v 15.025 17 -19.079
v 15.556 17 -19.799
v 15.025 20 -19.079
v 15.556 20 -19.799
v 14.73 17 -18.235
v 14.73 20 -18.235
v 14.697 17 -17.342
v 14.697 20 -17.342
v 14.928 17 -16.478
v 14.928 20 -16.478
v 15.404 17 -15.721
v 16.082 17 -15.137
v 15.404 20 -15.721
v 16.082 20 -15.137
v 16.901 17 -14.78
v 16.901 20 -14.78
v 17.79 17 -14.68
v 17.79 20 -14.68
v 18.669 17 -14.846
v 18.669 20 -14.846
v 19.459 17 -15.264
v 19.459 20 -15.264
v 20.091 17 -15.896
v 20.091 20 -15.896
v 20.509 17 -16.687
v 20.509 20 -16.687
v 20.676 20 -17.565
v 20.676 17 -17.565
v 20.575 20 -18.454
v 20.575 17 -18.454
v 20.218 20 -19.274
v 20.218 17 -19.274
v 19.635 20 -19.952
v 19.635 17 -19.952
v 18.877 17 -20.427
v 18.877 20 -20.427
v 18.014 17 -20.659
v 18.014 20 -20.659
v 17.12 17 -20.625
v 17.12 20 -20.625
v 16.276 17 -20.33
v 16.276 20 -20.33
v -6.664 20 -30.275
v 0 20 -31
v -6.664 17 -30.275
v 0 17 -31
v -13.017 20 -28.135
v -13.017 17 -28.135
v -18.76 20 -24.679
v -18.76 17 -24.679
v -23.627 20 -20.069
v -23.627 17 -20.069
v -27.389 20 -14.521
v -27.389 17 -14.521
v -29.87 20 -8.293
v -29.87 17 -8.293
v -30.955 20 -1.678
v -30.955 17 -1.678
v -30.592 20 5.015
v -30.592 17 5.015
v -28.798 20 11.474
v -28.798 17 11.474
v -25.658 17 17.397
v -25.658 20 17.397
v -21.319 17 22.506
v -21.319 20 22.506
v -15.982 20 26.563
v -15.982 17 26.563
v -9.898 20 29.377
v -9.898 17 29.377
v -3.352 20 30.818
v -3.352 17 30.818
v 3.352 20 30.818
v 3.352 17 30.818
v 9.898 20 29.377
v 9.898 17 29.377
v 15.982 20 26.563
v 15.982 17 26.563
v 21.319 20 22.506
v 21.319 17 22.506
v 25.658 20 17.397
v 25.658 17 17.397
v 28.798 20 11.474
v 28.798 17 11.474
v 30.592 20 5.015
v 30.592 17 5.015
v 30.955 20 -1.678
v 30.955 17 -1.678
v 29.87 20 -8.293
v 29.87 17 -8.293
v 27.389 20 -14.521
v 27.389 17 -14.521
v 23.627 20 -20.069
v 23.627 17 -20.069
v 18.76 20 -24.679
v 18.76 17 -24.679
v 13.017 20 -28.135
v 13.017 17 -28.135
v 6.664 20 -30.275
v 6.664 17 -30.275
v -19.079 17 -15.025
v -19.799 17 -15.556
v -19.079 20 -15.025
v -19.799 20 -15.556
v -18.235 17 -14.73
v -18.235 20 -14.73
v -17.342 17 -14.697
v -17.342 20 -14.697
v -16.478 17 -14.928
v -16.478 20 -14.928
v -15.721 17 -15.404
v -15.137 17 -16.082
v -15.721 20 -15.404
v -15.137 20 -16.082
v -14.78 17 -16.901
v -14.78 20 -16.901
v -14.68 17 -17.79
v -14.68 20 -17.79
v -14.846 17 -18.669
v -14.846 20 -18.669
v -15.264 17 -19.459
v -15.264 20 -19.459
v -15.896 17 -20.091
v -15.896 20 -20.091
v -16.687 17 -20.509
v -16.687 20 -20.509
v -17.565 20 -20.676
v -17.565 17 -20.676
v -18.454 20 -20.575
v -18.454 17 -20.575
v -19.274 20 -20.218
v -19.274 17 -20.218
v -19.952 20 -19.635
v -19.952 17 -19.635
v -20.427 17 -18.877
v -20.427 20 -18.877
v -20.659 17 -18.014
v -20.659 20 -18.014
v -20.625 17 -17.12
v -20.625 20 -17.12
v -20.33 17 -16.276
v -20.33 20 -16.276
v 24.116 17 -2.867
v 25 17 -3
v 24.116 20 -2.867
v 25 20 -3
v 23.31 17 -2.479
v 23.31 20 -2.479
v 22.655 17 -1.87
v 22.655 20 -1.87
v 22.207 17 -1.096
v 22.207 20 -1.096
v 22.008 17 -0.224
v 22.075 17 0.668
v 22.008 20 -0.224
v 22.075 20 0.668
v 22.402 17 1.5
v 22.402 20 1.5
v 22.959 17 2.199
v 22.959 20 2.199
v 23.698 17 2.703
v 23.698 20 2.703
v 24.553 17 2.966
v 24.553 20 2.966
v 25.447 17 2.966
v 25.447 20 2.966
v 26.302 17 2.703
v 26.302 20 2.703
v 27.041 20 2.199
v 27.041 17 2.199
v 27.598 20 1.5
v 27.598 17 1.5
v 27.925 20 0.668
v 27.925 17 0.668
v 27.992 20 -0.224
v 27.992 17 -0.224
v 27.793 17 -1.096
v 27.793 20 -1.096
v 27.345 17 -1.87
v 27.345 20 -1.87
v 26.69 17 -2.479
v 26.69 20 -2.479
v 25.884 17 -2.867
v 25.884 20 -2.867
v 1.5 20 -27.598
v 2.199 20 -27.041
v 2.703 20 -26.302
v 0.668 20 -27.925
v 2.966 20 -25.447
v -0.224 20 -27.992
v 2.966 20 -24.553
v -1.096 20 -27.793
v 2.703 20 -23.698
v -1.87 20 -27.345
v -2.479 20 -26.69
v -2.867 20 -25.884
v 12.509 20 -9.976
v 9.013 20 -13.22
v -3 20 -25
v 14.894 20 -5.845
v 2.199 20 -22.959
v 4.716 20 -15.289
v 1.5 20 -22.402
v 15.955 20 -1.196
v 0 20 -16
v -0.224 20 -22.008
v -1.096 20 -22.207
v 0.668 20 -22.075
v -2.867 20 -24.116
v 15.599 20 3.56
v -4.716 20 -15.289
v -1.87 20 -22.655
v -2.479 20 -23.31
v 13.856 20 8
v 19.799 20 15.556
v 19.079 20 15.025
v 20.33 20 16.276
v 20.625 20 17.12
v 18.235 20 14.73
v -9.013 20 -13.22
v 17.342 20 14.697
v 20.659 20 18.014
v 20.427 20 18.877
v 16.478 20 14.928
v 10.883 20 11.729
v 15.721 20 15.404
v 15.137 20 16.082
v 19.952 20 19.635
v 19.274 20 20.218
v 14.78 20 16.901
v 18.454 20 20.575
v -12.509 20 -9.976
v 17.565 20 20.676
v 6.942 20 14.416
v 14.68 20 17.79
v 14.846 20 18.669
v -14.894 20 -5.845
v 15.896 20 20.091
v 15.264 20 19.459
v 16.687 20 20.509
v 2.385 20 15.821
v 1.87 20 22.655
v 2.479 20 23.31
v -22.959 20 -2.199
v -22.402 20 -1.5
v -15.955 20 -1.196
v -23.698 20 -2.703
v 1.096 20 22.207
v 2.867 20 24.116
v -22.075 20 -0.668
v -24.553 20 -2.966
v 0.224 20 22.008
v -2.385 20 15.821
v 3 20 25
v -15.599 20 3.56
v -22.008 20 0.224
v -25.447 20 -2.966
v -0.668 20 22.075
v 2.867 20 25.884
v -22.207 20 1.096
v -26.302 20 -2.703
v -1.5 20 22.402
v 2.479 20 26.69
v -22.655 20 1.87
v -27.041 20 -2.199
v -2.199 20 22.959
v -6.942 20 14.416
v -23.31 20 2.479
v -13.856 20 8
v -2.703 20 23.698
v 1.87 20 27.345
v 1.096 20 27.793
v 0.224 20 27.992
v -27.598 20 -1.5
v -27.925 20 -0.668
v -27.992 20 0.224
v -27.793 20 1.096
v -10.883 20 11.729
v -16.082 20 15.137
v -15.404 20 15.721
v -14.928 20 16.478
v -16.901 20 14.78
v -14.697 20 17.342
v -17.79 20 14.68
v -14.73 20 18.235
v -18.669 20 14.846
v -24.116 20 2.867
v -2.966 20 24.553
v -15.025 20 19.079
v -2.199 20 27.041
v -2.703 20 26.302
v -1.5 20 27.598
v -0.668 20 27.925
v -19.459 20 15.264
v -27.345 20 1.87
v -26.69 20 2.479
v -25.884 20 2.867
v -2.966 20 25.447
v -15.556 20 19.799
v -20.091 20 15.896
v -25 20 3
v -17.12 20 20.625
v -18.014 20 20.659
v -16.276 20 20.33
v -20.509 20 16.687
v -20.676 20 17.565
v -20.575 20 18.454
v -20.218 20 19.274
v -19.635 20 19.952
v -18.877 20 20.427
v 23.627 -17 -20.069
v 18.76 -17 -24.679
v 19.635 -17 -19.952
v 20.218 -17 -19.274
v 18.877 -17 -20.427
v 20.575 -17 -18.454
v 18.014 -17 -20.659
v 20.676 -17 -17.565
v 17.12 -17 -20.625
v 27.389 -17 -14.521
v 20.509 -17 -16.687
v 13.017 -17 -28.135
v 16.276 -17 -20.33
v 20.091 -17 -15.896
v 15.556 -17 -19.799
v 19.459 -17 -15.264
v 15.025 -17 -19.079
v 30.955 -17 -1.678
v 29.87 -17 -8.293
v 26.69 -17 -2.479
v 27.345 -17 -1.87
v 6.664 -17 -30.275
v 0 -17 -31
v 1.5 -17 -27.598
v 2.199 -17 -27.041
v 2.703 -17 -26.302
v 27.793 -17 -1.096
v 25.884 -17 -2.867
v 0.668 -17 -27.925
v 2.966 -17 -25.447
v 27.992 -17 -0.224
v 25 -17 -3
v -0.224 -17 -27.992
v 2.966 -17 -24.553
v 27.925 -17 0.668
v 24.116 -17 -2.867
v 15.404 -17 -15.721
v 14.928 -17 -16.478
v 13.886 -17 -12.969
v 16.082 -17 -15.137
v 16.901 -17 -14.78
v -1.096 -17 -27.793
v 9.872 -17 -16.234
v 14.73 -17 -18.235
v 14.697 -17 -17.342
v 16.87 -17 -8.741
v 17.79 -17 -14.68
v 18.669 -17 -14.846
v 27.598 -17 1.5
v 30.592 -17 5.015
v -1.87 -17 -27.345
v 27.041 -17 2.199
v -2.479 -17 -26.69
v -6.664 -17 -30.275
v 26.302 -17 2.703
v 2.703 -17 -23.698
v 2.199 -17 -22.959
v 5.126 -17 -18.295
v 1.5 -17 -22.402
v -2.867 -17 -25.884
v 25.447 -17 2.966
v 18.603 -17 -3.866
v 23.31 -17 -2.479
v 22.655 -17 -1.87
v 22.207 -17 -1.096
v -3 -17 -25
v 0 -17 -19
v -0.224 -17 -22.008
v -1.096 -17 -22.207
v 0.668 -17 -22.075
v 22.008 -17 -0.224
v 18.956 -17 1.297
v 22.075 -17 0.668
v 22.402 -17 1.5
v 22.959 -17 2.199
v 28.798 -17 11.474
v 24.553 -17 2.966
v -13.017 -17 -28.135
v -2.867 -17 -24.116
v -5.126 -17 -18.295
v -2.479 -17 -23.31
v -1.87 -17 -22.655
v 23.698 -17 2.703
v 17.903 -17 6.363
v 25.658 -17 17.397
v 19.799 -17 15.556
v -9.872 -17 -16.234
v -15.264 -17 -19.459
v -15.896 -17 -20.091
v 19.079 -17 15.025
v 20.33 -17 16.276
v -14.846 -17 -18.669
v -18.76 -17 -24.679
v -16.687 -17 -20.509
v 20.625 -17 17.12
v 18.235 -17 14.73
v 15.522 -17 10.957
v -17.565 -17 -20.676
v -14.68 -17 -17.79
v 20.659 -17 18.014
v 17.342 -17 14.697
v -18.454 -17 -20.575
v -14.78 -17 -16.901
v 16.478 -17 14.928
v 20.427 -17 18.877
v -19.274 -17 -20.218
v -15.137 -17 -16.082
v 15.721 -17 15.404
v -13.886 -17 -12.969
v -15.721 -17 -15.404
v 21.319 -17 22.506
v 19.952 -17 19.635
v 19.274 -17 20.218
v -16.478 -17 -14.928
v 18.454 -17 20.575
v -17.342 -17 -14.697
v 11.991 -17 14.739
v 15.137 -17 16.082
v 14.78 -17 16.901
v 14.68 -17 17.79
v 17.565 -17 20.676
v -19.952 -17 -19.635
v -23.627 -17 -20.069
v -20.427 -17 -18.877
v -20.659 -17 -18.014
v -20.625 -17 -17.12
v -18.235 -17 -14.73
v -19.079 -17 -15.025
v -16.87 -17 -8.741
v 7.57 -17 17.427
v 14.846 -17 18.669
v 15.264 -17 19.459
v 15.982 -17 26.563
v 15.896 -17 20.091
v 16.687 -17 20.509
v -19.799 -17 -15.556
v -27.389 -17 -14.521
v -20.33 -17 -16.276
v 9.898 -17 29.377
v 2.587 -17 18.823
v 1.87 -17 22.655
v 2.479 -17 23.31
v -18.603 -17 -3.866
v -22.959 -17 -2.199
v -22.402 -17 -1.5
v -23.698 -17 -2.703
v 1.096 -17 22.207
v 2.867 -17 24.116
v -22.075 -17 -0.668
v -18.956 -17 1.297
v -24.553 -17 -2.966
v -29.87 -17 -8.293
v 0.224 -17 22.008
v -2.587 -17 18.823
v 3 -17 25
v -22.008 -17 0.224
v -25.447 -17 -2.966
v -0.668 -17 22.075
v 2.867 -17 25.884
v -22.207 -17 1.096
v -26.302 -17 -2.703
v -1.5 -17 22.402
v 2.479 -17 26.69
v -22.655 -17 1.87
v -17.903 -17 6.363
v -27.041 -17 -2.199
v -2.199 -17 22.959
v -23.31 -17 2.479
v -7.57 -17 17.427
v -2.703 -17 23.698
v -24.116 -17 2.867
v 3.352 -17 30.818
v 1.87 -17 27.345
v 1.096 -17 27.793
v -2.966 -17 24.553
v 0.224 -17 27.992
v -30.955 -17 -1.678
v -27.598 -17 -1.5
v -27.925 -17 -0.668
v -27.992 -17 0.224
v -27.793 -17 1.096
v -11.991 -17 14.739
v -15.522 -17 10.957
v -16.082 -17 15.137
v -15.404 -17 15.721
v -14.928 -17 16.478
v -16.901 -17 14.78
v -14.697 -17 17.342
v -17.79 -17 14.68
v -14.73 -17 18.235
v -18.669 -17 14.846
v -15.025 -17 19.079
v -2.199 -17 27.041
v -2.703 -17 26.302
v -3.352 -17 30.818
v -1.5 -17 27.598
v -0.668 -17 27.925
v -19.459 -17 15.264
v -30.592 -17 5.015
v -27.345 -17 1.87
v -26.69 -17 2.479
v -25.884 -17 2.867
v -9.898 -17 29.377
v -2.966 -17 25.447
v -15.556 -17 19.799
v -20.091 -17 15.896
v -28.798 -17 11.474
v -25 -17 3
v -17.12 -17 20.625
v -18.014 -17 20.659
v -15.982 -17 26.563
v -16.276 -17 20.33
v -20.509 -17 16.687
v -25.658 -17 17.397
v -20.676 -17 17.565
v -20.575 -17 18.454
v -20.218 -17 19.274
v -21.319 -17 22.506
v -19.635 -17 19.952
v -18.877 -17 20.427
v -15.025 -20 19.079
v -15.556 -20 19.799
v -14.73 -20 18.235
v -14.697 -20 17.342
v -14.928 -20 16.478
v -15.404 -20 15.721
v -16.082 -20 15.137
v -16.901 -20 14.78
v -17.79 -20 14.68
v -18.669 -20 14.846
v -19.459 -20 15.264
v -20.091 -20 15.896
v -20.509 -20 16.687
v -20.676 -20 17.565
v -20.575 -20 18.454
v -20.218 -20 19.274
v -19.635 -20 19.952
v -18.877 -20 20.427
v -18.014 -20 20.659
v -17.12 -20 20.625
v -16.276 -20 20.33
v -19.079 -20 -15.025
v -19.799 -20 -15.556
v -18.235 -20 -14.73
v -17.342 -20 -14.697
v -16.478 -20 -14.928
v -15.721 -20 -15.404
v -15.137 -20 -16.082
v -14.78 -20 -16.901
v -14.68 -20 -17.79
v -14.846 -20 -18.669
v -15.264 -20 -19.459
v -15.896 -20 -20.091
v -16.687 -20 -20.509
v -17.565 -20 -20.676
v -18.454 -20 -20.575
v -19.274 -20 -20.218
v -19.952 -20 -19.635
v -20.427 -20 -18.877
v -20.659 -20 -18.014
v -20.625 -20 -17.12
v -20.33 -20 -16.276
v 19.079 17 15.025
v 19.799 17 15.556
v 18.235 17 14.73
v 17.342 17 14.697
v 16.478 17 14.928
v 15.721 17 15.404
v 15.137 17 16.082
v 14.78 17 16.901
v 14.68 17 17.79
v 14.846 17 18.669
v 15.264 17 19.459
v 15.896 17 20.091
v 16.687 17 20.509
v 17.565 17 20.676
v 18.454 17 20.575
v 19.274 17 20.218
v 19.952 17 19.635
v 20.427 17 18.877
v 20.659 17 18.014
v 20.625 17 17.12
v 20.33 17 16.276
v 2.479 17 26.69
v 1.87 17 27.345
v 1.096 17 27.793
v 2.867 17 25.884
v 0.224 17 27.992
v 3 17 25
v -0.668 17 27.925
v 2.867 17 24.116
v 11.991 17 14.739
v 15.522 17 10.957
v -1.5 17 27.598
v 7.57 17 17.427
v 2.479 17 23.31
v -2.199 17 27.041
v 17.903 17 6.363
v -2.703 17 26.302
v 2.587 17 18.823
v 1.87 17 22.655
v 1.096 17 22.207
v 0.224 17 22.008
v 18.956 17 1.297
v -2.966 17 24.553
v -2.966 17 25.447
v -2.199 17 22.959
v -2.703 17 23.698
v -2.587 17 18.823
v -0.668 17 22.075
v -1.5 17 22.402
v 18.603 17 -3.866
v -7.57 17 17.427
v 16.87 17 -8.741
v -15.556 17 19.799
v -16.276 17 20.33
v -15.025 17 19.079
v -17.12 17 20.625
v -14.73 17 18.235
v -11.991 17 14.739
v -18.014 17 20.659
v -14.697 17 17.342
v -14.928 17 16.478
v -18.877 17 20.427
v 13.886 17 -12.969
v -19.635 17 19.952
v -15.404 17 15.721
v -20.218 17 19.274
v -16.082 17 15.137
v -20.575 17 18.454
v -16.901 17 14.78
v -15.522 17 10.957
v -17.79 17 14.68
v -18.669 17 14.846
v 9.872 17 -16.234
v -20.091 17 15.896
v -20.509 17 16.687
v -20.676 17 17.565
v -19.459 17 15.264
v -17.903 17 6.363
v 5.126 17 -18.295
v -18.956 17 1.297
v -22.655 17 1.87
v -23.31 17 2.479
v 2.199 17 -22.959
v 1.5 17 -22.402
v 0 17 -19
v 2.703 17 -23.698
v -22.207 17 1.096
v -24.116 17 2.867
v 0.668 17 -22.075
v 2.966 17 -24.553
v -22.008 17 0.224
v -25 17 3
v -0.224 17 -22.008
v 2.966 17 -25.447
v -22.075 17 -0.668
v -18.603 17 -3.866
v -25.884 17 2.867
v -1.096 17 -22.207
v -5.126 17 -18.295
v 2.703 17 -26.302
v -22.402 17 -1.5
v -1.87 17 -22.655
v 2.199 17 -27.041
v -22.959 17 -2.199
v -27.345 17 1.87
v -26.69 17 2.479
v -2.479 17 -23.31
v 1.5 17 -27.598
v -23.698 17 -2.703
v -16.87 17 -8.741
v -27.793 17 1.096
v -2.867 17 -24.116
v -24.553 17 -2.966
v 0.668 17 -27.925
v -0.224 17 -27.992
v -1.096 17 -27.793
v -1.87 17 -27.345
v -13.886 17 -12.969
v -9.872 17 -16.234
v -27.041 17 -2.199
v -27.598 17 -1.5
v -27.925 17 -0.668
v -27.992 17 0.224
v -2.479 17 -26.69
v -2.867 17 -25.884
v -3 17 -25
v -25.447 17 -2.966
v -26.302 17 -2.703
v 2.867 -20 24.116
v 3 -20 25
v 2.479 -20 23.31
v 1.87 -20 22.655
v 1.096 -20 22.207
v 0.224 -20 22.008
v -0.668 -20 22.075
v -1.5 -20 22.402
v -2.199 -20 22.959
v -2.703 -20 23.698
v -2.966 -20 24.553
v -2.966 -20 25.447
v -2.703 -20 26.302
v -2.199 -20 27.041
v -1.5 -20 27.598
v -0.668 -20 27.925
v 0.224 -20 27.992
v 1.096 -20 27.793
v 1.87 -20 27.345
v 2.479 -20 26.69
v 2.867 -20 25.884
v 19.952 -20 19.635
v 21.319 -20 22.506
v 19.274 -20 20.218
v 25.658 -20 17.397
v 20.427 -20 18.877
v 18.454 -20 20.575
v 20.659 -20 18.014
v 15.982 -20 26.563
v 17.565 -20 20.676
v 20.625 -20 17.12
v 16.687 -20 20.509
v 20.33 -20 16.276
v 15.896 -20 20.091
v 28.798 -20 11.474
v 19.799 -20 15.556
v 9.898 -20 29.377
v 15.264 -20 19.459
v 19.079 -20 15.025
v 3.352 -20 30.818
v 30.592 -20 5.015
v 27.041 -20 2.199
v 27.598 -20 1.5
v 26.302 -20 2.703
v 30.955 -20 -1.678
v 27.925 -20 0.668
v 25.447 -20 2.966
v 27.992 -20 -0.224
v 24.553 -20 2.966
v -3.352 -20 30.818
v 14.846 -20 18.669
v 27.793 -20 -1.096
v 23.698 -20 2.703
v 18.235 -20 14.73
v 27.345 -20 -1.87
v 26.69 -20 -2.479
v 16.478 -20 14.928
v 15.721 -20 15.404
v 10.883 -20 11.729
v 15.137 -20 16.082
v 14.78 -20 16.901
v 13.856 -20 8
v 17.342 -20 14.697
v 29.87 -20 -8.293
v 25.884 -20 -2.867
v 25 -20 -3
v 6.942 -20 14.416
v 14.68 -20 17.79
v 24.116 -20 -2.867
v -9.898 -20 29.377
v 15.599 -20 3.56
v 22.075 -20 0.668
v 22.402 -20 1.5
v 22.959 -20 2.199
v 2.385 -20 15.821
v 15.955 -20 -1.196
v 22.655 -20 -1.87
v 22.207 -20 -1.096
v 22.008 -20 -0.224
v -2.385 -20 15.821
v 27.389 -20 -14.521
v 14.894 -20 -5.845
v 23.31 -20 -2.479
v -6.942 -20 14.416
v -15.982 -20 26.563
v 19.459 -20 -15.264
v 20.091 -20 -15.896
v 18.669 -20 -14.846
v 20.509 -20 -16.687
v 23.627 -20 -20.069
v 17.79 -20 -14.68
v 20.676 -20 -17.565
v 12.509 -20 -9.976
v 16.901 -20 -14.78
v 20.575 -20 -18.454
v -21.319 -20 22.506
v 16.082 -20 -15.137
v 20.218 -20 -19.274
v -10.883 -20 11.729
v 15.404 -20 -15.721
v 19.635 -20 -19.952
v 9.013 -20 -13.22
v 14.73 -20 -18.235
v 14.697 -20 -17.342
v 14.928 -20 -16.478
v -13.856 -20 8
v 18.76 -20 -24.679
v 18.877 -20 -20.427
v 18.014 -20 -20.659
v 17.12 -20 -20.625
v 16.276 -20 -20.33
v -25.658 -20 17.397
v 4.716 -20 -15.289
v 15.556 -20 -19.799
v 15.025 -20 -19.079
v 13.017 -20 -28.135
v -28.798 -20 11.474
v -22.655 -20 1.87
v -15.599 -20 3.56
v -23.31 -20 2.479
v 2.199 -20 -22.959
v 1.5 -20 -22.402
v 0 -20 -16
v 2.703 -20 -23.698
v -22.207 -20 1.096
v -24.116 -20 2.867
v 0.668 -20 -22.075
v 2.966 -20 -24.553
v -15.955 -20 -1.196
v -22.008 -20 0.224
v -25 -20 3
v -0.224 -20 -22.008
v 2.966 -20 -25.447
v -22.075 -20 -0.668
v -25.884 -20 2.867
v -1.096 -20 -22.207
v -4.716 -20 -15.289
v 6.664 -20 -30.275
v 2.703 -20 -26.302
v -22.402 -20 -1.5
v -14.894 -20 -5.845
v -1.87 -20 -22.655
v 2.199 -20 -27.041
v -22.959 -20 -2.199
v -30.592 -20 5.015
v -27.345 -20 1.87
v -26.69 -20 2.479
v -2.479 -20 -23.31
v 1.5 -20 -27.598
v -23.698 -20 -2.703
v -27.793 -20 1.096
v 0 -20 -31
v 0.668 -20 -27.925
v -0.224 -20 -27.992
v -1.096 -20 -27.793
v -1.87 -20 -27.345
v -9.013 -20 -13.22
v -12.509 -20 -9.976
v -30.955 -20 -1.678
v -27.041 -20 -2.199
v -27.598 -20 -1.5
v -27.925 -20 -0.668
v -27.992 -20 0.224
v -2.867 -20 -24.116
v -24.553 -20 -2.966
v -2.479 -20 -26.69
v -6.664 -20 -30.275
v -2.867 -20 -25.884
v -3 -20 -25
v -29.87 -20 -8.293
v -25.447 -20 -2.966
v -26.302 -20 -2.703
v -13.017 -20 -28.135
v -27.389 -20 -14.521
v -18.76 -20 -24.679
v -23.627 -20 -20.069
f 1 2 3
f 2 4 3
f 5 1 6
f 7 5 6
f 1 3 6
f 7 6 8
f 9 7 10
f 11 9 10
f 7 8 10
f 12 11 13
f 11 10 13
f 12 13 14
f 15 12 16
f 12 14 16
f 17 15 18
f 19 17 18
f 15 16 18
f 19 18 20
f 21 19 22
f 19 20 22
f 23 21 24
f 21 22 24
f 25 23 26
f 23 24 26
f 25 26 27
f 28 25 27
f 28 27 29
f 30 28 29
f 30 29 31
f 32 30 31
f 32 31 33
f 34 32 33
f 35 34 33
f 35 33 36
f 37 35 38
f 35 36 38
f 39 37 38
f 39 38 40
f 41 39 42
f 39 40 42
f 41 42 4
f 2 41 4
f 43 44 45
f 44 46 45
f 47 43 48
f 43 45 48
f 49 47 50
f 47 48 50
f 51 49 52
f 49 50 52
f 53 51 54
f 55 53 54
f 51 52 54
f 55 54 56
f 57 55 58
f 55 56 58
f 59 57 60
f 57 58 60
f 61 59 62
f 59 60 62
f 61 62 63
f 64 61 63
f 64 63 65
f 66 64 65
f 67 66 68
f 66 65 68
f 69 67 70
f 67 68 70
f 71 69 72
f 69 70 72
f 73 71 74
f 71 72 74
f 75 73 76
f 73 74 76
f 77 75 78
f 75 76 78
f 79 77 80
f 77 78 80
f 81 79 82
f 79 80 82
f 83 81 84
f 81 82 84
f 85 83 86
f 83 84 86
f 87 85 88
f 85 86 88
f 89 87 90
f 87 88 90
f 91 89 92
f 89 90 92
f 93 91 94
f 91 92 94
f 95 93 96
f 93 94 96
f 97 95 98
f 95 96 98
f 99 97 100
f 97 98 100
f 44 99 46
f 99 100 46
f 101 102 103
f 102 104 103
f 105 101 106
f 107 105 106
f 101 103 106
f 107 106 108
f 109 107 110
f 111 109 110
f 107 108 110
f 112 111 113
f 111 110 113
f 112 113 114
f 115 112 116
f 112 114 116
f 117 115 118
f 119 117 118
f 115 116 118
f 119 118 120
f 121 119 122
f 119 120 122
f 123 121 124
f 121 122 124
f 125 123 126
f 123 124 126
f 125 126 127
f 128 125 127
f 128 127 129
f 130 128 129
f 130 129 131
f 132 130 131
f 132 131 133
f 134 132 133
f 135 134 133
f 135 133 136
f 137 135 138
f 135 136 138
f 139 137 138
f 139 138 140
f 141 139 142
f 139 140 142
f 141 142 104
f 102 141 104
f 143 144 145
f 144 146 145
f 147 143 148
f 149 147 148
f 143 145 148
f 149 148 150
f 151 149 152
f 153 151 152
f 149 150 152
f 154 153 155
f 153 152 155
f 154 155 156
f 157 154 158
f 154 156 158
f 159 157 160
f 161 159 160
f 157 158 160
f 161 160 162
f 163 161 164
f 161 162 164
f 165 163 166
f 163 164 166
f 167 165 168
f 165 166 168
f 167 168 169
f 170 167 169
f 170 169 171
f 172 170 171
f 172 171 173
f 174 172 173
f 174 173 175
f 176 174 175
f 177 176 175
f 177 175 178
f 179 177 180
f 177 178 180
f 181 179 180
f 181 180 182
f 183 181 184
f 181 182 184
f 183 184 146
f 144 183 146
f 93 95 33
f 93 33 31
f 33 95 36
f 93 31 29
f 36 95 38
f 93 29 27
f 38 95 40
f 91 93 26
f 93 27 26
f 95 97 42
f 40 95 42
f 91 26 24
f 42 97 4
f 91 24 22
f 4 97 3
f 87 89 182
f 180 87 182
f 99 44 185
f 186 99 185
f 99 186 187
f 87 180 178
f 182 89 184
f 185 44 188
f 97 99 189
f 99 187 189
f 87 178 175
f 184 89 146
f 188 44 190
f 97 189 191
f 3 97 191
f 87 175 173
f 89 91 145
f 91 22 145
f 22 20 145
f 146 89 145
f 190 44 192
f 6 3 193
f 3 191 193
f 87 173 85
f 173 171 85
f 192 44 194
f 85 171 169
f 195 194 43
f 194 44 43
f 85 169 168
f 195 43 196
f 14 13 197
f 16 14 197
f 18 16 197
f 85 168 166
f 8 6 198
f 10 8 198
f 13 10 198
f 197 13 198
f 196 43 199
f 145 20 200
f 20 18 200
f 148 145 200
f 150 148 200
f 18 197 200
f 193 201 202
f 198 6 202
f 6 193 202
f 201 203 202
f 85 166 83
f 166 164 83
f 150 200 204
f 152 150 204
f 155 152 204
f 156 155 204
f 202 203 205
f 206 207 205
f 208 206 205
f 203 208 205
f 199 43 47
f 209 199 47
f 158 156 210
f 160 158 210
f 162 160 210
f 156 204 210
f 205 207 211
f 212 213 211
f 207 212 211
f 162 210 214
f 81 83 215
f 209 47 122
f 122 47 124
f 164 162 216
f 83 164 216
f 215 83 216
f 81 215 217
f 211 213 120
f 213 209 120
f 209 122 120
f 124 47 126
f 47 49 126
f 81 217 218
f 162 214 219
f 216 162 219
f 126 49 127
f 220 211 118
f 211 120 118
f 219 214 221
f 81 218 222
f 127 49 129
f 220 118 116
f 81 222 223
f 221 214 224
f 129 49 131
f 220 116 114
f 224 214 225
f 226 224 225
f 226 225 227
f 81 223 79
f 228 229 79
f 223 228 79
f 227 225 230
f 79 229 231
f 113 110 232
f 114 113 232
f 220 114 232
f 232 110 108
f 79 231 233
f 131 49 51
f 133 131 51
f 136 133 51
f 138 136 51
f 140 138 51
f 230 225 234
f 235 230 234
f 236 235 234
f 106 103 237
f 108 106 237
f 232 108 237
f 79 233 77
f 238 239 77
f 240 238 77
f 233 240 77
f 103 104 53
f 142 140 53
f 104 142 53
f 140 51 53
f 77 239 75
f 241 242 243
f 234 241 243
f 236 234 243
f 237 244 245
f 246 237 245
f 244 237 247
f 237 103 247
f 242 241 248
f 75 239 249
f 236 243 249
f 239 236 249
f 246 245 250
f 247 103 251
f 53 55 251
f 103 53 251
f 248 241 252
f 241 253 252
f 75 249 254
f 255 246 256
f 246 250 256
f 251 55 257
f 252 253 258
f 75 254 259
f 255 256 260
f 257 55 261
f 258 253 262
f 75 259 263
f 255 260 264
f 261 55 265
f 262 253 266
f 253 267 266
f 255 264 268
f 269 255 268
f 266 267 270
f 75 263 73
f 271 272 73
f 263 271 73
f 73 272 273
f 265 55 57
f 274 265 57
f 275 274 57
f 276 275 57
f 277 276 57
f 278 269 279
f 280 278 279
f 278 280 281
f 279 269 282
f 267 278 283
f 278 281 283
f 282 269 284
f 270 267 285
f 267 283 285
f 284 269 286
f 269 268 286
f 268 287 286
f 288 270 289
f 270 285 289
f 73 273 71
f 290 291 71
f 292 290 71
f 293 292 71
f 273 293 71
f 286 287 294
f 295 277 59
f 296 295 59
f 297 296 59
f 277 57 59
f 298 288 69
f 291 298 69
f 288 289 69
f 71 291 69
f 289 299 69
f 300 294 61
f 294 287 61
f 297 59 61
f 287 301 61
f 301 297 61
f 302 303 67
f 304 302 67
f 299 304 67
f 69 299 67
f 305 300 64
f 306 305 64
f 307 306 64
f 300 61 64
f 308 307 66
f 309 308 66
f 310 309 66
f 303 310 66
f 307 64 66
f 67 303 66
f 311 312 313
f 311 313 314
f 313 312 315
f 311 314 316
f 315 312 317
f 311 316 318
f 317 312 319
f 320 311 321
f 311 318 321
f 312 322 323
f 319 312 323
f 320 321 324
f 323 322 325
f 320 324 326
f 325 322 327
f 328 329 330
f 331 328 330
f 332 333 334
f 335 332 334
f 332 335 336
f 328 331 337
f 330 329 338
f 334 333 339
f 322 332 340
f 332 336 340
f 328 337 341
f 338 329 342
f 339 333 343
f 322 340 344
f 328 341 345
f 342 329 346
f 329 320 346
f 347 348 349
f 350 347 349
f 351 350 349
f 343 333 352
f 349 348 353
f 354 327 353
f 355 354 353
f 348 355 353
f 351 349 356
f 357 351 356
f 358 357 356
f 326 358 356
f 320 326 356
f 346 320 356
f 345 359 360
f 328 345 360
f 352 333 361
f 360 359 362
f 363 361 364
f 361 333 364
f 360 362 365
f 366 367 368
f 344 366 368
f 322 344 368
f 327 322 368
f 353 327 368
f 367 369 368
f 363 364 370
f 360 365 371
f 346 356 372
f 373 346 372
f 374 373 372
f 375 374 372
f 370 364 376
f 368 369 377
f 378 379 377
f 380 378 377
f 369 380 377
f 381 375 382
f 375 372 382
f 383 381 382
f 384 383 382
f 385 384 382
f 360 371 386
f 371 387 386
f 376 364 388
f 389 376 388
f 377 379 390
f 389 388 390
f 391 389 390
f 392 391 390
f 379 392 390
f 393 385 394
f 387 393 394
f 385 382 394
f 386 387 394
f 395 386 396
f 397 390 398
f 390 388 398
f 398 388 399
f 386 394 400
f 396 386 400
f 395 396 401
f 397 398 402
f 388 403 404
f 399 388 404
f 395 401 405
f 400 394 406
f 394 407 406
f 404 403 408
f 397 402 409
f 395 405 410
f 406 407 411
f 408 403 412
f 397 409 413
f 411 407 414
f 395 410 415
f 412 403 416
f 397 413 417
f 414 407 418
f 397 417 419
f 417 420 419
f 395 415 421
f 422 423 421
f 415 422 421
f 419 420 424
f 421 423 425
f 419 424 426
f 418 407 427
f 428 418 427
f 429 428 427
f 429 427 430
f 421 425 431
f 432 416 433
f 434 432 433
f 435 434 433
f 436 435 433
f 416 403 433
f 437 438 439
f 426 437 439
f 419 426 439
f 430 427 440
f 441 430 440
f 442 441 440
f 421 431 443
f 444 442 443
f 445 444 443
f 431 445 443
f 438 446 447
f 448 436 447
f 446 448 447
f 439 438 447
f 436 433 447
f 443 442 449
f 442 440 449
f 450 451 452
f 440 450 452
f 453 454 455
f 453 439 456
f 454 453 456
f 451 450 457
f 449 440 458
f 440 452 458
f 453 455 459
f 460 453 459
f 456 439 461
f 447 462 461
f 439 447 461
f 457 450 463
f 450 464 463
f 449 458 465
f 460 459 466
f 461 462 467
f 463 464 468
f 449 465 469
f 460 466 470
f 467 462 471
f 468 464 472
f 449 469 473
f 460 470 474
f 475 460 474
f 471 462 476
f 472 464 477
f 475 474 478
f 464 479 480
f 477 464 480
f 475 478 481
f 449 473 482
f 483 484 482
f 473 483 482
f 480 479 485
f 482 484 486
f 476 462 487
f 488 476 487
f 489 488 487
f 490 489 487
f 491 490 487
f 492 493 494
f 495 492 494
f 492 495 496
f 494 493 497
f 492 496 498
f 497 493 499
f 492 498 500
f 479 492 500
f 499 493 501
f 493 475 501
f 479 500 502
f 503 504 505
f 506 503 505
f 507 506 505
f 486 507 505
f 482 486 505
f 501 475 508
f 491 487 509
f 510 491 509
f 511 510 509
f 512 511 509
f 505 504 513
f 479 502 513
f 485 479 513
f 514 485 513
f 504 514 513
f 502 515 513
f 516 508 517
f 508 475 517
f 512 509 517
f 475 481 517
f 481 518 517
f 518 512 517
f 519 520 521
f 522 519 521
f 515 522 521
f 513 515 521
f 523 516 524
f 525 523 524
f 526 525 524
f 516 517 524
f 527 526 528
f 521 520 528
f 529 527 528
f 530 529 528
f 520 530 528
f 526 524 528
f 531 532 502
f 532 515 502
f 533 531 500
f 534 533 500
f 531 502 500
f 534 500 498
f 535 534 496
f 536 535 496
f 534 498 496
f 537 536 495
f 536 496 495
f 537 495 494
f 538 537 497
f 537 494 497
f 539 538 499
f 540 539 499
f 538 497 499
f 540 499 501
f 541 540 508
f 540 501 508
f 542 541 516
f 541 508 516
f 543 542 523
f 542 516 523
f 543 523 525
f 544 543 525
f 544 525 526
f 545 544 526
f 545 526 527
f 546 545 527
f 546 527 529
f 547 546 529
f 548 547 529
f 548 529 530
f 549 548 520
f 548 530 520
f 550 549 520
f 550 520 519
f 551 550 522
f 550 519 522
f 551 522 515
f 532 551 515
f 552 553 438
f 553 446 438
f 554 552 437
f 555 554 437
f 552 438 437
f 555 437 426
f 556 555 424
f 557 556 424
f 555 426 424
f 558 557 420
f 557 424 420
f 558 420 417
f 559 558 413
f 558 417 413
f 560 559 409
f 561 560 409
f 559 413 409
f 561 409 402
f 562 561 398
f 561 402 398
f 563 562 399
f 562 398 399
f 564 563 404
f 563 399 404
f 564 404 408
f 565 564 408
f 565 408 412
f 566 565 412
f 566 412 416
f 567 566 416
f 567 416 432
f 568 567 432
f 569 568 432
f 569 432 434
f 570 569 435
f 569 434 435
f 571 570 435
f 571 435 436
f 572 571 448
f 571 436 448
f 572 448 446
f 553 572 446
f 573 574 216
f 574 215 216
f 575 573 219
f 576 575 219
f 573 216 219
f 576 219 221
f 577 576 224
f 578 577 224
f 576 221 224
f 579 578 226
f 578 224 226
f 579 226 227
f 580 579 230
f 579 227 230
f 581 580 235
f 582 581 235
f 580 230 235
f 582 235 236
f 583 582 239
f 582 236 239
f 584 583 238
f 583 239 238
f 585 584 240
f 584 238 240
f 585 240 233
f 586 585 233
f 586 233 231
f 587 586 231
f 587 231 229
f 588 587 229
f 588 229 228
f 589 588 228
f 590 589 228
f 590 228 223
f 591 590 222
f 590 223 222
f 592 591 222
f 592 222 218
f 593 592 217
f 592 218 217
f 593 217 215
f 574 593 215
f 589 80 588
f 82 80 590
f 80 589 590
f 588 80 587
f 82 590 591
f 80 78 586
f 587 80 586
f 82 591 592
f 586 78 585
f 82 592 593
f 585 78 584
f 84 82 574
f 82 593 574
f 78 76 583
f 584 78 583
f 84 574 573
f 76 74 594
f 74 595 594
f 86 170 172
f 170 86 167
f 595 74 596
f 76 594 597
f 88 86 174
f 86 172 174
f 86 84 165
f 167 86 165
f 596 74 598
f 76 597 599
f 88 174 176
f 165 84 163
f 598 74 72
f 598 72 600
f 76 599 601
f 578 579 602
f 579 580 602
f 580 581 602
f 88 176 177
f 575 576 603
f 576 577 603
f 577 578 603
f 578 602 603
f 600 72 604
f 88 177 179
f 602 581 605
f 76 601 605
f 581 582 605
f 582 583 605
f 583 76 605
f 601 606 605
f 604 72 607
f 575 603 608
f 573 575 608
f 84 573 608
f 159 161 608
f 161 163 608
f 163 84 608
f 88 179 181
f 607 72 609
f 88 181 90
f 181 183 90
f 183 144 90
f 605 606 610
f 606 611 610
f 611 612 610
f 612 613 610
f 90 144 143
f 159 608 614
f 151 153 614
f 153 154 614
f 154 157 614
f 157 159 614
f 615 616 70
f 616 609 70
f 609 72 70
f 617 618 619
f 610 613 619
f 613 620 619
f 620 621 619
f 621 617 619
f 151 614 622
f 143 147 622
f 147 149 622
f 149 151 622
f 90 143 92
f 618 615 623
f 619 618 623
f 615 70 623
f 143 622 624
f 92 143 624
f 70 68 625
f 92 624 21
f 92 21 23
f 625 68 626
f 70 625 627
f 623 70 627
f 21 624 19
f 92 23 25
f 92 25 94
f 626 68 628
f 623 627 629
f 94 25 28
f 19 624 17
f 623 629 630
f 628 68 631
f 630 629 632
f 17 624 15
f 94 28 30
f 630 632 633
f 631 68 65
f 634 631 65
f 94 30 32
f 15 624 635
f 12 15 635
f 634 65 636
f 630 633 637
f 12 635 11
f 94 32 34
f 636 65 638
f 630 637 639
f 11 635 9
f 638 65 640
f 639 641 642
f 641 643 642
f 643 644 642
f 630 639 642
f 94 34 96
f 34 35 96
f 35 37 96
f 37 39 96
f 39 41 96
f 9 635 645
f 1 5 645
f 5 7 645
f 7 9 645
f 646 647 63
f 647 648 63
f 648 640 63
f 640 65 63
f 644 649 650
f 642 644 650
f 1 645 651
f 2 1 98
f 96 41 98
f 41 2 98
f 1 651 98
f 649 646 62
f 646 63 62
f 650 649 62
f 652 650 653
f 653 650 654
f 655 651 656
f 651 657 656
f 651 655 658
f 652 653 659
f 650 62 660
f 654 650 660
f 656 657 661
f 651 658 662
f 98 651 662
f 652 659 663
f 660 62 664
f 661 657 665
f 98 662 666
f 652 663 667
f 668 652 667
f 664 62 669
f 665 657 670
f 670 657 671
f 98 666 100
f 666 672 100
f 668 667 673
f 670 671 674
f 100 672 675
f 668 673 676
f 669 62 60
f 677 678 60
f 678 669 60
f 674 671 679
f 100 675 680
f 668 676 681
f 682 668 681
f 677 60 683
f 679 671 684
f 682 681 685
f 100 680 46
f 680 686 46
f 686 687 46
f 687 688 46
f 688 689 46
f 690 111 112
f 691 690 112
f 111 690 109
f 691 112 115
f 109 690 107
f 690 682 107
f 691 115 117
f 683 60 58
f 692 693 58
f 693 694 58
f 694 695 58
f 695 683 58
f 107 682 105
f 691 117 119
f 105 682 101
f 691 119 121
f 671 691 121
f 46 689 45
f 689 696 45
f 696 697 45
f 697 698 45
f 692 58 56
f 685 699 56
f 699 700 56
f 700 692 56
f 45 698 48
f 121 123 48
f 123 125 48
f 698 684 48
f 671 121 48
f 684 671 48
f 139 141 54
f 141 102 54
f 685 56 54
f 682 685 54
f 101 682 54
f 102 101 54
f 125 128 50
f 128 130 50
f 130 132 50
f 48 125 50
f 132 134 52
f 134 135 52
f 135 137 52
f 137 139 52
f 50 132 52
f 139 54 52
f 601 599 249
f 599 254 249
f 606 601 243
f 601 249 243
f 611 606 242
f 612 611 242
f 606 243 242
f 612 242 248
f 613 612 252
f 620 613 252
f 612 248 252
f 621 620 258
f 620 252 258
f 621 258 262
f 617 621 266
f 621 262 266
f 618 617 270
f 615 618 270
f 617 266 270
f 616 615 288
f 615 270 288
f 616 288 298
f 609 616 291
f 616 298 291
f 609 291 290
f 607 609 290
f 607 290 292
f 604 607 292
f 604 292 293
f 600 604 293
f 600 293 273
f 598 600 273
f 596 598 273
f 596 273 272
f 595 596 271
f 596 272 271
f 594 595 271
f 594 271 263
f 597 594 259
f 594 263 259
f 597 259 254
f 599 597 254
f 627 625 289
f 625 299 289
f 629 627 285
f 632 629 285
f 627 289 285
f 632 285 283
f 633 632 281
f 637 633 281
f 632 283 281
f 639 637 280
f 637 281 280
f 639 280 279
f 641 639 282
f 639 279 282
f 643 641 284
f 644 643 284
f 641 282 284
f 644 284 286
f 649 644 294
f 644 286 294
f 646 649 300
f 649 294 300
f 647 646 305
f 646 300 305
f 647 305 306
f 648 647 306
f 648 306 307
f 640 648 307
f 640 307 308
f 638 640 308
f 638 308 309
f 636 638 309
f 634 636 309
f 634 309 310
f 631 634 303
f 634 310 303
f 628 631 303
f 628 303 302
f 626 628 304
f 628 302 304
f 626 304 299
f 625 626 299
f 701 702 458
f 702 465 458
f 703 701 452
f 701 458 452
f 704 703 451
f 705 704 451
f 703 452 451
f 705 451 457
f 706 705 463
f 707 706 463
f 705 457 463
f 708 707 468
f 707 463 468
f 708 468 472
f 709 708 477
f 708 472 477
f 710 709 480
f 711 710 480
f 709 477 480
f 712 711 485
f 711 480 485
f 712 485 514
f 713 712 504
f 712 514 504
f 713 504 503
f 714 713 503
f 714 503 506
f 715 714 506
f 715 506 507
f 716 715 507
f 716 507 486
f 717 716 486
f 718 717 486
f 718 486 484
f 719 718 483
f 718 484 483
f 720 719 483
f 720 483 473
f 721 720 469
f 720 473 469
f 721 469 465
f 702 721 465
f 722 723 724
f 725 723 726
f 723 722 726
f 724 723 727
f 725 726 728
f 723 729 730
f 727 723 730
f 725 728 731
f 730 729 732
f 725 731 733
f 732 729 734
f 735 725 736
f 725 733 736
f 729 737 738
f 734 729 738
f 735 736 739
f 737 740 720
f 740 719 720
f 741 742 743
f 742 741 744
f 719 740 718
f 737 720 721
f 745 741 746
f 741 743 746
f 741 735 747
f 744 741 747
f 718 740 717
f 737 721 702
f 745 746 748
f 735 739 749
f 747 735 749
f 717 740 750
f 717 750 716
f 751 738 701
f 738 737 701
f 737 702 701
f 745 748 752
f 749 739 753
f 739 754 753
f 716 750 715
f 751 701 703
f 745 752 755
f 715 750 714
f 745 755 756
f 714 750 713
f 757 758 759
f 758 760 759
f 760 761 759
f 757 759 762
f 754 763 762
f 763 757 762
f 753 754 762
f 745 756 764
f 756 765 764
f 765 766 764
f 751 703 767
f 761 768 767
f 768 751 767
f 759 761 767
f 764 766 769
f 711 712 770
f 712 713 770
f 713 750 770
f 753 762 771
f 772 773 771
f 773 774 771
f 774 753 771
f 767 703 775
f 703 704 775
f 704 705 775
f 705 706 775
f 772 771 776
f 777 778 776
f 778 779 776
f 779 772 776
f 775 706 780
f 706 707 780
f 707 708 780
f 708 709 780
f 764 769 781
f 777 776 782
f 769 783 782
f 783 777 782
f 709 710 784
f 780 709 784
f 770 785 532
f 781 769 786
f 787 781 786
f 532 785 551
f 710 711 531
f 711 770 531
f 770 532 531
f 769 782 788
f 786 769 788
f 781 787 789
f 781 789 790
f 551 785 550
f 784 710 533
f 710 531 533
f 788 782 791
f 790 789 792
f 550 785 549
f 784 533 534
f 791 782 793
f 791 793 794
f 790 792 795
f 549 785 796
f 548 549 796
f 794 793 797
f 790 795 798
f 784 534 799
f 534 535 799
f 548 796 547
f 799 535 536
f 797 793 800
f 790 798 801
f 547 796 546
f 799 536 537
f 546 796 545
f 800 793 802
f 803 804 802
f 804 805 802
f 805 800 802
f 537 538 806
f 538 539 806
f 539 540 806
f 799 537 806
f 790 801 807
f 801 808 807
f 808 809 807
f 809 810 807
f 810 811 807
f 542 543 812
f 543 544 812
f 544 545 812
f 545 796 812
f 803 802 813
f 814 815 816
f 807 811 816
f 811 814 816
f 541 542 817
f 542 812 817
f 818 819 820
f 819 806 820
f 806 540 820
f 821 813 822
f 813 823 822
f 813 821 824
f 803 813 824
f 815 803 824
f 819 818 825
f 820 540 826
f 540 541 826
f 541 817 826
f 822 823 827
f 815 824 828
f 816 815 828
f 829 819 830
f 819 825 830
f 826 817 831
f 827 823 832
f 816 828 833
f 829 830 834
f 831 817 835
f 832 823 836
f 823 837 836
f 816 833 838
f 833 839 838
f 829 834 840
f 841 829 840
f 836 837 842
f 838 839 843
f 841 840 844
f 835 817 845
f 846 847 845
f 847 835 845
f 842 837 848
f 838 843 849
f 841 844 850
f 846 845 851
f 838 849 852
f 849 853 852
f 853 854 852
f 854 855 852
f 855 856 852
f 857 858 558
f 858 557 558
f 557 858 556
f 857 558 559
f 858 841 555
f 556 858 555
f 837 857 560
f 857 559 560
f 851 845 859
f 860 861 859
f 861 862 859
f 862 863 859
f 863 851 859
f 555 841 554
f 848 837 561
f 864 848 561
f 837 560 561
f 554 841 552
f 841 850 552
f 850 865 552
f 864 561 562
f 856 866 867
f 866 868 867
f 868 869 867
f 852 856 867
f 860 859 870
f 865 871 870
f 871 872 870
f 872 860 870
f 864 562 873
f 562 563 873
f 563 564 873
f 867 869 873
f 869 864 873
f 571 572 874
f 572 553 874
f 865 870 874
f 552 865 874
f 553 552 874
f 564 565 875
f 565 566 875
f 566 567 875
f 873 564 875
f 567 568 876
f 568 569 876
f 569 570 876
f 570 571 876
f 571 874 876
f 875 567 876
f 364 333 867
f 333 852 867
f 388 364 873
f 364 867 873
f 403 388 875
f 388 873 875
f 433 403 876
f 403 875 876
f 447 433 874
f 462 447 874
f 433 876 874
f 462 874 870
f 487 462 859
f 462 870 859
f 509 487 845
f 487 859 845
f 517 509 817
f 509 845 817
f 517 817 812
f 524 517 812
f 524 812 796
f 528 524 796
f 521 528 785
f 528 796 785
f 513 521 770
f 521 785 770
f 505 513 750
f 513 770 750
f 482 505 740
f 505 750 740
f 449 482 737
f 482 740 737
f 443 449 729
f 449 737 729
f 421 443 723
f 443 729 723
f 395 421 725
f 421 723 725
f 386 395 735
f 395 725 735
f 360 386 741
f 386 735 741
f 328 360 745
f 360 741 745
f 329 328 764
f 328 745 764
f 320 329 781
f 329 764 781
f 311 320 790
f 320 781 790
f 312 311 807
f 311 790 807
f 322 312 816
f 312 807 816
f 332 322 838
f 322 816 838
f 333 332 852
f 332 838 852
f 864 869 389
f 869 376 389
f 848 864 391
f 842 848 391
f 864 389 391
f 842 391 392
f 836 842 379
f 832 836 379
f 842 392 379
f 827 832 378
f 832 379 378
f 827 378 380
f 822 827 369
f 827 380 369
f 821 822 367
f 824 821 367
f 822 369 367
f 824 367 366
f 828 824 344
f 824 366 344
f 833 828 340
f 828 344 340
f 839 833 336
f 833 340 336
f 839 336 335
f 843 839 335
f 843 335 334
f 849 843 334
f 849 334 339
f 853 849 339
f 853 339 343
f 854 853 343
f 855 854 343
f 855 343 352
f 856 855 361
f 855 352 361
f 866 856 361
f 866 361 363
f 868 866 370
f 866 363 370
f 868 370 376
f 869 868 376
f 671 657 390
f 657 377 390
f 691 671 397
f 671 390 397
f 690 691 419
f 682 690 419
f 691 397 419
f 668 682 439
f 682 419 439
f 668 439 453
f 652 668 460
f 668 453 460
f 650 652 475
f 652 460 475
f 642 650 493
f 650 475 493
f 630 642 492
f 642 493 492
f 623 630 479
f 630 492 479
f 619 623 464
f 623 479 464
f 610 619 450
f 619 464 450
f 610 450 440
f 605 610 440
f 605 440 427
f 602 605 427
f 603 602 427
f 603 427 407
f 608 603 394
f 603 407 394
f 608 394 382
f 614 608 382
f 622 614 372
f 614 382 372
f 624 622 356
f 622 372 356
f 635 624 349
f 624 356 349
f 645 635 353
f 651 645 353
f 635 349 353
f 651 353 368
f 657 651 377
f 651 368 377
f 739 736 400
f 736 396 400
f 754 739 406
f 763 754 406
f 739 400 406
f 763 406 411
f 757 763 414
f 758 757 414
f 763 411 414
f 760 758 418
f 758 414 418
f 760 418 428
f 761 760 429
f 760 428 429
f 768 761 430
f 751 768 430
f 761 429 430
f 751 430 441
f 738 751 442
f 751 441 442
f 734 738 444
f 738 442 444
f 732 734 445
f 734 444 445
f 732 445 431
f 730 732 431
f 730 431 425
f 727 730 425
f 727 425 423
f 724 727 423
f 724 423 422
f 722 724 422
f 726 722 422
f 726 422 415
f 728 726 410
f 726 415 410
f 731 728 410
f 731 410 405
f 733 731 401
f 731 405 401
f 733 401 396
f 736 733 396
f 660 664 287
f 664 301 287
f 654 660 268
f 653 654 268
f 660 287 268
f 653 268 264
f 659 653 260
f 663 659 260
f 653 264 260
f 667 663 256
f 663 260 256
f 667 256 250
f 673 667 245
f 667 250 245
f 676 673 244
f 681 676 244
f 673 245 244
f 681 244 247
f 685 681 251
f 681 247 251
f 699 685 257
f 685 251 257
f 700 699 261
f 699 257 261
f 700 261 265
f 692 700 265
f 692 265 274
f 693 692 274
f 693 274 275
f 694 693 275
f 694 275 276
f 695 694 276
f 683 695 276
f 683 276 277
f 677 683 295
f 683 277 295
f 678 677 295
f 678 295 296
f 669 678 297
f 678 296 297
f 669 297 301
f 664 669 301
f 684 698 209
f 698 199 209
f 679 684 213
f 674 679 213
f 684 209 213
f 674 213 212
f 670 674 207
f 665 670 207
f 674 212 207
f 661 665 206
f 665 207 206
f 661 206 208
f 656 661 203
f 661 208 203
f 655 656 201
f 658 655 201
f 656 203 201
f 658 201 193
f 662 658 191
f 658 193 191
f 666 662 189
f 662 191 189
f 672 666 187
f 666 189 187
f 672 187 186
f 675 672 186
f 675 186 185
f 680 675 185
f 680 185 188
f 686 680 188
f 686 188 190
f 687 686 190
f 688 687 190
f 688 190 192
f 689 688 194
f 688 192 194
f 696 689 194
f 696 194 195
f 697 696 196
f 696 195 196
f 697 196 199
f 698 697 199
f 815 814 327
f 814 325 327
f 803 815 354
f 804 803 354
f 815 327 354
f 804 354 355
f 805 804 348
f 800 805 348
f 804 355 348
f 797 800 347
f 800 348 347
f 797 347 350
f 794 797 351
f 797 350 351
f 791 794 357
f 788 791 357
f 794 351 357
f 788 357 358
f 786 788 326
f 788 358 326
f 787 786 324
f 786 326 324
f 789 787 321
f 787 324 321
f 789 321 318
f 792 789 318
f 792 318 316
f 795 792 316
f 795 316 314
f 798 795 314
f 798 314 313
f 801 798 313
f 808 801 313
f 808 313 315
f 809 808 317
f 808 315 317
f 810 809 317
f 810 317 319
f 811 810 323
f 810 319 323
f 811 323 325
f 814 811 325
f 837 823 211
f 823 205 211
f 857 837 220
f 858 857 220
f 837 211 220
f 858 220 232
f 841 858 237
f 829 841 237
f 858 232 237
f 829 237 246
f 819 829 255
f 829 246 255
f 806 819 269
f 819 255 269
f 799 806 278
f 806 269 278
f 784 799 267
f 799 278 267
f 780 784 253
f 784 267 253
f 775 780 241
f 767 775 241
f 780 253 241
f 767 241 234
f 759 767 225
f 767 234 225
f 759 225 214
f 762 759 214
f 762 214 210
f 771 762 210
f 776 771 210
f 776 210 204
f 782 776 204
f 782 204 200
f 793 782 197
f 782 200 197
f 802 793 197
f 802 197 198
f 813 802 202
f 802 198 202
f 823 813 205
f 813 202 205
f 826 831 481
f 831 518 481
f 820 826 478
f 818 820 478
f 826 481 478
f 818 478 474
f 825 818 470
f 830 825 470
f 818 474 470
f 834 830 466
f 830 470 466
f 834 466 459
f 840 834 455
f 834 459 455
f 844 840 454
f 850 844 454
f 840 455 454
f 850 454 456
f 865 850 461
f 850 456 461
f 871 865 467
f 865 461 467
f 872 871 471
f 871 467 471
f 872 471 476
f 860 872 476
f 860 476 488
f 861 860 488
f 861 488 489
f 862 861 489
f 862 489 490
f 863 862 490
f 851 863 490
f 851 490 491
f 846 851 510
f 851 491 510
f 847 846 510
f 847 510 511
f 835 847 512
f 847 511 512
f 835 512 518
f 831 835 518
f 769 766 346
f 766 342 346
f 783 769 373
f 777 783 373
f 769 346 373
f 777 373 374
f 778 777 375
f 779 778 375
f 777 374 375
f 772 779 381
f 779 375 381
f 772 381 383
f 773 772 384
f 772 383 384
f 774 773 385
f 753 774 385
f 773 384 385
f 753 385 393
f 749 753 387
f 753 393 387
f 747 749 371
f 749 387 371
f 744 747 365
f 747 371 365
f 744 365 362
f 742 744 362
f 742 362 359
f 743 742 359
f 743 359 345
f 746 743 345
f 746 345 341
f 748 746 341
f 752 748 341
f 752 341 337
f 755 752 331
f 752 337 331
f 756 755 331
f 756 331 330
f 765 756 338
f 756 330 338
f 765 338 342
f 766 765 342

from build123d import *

# Parameters (mm, degrees)
SKETCH5_R          = 3
CUT_EXTRUDE2_DEPTH = 500
CIRPATTERN2_COUNT  = 8


with BuildPart() as part:
    # Sketch4 → Revolve1 (revolve)
    with BuildSketch(Plane.XY, mode=Mode.PRIVATE) as revolve1_sk:
        Polygon((19, 17), (19, -17), (31, -17), (31, -20), (16, -20), (16, 20), (31, 20), (31, 17), align=None)
    revolve(revolve1_sk.sketch.rotate(Axis((0, 0, 0), (0, 1, 0)), 90), axis=Axis((0, 0, 0), (0, 1, 0)))

    # Sketch5 → Cut-Extrude2 (cut, symmetric)
    with BuildSketch(Plane(origin=(0, -17, 0), x_dir=(1, 0, 0), z_dir=(0, 1, 0))):
        with Locations(Location((25, 0, 0), (0, 0, 90))):
            Circle(SKETCH5_R)
    cut_extrude2 = extrude(amount=CUT_EXTRUDE2_DEPTH, both=True, mode=Mode.SUBTRACT)

    # CirPattern2: Cut-Extrude2 ×8 about axis
    cirpattern2_axis = Axis((0, 0, 0), (0, 1, 0))
    for i in range(1, CIRPATTERN2_COUNT):
        add(cut_extrude2.rotate(cirpattern2_axis, i * 360 / CIRPATTERN2_COUNT), mode=Mode.SUBTRACT)


solid = part.part
